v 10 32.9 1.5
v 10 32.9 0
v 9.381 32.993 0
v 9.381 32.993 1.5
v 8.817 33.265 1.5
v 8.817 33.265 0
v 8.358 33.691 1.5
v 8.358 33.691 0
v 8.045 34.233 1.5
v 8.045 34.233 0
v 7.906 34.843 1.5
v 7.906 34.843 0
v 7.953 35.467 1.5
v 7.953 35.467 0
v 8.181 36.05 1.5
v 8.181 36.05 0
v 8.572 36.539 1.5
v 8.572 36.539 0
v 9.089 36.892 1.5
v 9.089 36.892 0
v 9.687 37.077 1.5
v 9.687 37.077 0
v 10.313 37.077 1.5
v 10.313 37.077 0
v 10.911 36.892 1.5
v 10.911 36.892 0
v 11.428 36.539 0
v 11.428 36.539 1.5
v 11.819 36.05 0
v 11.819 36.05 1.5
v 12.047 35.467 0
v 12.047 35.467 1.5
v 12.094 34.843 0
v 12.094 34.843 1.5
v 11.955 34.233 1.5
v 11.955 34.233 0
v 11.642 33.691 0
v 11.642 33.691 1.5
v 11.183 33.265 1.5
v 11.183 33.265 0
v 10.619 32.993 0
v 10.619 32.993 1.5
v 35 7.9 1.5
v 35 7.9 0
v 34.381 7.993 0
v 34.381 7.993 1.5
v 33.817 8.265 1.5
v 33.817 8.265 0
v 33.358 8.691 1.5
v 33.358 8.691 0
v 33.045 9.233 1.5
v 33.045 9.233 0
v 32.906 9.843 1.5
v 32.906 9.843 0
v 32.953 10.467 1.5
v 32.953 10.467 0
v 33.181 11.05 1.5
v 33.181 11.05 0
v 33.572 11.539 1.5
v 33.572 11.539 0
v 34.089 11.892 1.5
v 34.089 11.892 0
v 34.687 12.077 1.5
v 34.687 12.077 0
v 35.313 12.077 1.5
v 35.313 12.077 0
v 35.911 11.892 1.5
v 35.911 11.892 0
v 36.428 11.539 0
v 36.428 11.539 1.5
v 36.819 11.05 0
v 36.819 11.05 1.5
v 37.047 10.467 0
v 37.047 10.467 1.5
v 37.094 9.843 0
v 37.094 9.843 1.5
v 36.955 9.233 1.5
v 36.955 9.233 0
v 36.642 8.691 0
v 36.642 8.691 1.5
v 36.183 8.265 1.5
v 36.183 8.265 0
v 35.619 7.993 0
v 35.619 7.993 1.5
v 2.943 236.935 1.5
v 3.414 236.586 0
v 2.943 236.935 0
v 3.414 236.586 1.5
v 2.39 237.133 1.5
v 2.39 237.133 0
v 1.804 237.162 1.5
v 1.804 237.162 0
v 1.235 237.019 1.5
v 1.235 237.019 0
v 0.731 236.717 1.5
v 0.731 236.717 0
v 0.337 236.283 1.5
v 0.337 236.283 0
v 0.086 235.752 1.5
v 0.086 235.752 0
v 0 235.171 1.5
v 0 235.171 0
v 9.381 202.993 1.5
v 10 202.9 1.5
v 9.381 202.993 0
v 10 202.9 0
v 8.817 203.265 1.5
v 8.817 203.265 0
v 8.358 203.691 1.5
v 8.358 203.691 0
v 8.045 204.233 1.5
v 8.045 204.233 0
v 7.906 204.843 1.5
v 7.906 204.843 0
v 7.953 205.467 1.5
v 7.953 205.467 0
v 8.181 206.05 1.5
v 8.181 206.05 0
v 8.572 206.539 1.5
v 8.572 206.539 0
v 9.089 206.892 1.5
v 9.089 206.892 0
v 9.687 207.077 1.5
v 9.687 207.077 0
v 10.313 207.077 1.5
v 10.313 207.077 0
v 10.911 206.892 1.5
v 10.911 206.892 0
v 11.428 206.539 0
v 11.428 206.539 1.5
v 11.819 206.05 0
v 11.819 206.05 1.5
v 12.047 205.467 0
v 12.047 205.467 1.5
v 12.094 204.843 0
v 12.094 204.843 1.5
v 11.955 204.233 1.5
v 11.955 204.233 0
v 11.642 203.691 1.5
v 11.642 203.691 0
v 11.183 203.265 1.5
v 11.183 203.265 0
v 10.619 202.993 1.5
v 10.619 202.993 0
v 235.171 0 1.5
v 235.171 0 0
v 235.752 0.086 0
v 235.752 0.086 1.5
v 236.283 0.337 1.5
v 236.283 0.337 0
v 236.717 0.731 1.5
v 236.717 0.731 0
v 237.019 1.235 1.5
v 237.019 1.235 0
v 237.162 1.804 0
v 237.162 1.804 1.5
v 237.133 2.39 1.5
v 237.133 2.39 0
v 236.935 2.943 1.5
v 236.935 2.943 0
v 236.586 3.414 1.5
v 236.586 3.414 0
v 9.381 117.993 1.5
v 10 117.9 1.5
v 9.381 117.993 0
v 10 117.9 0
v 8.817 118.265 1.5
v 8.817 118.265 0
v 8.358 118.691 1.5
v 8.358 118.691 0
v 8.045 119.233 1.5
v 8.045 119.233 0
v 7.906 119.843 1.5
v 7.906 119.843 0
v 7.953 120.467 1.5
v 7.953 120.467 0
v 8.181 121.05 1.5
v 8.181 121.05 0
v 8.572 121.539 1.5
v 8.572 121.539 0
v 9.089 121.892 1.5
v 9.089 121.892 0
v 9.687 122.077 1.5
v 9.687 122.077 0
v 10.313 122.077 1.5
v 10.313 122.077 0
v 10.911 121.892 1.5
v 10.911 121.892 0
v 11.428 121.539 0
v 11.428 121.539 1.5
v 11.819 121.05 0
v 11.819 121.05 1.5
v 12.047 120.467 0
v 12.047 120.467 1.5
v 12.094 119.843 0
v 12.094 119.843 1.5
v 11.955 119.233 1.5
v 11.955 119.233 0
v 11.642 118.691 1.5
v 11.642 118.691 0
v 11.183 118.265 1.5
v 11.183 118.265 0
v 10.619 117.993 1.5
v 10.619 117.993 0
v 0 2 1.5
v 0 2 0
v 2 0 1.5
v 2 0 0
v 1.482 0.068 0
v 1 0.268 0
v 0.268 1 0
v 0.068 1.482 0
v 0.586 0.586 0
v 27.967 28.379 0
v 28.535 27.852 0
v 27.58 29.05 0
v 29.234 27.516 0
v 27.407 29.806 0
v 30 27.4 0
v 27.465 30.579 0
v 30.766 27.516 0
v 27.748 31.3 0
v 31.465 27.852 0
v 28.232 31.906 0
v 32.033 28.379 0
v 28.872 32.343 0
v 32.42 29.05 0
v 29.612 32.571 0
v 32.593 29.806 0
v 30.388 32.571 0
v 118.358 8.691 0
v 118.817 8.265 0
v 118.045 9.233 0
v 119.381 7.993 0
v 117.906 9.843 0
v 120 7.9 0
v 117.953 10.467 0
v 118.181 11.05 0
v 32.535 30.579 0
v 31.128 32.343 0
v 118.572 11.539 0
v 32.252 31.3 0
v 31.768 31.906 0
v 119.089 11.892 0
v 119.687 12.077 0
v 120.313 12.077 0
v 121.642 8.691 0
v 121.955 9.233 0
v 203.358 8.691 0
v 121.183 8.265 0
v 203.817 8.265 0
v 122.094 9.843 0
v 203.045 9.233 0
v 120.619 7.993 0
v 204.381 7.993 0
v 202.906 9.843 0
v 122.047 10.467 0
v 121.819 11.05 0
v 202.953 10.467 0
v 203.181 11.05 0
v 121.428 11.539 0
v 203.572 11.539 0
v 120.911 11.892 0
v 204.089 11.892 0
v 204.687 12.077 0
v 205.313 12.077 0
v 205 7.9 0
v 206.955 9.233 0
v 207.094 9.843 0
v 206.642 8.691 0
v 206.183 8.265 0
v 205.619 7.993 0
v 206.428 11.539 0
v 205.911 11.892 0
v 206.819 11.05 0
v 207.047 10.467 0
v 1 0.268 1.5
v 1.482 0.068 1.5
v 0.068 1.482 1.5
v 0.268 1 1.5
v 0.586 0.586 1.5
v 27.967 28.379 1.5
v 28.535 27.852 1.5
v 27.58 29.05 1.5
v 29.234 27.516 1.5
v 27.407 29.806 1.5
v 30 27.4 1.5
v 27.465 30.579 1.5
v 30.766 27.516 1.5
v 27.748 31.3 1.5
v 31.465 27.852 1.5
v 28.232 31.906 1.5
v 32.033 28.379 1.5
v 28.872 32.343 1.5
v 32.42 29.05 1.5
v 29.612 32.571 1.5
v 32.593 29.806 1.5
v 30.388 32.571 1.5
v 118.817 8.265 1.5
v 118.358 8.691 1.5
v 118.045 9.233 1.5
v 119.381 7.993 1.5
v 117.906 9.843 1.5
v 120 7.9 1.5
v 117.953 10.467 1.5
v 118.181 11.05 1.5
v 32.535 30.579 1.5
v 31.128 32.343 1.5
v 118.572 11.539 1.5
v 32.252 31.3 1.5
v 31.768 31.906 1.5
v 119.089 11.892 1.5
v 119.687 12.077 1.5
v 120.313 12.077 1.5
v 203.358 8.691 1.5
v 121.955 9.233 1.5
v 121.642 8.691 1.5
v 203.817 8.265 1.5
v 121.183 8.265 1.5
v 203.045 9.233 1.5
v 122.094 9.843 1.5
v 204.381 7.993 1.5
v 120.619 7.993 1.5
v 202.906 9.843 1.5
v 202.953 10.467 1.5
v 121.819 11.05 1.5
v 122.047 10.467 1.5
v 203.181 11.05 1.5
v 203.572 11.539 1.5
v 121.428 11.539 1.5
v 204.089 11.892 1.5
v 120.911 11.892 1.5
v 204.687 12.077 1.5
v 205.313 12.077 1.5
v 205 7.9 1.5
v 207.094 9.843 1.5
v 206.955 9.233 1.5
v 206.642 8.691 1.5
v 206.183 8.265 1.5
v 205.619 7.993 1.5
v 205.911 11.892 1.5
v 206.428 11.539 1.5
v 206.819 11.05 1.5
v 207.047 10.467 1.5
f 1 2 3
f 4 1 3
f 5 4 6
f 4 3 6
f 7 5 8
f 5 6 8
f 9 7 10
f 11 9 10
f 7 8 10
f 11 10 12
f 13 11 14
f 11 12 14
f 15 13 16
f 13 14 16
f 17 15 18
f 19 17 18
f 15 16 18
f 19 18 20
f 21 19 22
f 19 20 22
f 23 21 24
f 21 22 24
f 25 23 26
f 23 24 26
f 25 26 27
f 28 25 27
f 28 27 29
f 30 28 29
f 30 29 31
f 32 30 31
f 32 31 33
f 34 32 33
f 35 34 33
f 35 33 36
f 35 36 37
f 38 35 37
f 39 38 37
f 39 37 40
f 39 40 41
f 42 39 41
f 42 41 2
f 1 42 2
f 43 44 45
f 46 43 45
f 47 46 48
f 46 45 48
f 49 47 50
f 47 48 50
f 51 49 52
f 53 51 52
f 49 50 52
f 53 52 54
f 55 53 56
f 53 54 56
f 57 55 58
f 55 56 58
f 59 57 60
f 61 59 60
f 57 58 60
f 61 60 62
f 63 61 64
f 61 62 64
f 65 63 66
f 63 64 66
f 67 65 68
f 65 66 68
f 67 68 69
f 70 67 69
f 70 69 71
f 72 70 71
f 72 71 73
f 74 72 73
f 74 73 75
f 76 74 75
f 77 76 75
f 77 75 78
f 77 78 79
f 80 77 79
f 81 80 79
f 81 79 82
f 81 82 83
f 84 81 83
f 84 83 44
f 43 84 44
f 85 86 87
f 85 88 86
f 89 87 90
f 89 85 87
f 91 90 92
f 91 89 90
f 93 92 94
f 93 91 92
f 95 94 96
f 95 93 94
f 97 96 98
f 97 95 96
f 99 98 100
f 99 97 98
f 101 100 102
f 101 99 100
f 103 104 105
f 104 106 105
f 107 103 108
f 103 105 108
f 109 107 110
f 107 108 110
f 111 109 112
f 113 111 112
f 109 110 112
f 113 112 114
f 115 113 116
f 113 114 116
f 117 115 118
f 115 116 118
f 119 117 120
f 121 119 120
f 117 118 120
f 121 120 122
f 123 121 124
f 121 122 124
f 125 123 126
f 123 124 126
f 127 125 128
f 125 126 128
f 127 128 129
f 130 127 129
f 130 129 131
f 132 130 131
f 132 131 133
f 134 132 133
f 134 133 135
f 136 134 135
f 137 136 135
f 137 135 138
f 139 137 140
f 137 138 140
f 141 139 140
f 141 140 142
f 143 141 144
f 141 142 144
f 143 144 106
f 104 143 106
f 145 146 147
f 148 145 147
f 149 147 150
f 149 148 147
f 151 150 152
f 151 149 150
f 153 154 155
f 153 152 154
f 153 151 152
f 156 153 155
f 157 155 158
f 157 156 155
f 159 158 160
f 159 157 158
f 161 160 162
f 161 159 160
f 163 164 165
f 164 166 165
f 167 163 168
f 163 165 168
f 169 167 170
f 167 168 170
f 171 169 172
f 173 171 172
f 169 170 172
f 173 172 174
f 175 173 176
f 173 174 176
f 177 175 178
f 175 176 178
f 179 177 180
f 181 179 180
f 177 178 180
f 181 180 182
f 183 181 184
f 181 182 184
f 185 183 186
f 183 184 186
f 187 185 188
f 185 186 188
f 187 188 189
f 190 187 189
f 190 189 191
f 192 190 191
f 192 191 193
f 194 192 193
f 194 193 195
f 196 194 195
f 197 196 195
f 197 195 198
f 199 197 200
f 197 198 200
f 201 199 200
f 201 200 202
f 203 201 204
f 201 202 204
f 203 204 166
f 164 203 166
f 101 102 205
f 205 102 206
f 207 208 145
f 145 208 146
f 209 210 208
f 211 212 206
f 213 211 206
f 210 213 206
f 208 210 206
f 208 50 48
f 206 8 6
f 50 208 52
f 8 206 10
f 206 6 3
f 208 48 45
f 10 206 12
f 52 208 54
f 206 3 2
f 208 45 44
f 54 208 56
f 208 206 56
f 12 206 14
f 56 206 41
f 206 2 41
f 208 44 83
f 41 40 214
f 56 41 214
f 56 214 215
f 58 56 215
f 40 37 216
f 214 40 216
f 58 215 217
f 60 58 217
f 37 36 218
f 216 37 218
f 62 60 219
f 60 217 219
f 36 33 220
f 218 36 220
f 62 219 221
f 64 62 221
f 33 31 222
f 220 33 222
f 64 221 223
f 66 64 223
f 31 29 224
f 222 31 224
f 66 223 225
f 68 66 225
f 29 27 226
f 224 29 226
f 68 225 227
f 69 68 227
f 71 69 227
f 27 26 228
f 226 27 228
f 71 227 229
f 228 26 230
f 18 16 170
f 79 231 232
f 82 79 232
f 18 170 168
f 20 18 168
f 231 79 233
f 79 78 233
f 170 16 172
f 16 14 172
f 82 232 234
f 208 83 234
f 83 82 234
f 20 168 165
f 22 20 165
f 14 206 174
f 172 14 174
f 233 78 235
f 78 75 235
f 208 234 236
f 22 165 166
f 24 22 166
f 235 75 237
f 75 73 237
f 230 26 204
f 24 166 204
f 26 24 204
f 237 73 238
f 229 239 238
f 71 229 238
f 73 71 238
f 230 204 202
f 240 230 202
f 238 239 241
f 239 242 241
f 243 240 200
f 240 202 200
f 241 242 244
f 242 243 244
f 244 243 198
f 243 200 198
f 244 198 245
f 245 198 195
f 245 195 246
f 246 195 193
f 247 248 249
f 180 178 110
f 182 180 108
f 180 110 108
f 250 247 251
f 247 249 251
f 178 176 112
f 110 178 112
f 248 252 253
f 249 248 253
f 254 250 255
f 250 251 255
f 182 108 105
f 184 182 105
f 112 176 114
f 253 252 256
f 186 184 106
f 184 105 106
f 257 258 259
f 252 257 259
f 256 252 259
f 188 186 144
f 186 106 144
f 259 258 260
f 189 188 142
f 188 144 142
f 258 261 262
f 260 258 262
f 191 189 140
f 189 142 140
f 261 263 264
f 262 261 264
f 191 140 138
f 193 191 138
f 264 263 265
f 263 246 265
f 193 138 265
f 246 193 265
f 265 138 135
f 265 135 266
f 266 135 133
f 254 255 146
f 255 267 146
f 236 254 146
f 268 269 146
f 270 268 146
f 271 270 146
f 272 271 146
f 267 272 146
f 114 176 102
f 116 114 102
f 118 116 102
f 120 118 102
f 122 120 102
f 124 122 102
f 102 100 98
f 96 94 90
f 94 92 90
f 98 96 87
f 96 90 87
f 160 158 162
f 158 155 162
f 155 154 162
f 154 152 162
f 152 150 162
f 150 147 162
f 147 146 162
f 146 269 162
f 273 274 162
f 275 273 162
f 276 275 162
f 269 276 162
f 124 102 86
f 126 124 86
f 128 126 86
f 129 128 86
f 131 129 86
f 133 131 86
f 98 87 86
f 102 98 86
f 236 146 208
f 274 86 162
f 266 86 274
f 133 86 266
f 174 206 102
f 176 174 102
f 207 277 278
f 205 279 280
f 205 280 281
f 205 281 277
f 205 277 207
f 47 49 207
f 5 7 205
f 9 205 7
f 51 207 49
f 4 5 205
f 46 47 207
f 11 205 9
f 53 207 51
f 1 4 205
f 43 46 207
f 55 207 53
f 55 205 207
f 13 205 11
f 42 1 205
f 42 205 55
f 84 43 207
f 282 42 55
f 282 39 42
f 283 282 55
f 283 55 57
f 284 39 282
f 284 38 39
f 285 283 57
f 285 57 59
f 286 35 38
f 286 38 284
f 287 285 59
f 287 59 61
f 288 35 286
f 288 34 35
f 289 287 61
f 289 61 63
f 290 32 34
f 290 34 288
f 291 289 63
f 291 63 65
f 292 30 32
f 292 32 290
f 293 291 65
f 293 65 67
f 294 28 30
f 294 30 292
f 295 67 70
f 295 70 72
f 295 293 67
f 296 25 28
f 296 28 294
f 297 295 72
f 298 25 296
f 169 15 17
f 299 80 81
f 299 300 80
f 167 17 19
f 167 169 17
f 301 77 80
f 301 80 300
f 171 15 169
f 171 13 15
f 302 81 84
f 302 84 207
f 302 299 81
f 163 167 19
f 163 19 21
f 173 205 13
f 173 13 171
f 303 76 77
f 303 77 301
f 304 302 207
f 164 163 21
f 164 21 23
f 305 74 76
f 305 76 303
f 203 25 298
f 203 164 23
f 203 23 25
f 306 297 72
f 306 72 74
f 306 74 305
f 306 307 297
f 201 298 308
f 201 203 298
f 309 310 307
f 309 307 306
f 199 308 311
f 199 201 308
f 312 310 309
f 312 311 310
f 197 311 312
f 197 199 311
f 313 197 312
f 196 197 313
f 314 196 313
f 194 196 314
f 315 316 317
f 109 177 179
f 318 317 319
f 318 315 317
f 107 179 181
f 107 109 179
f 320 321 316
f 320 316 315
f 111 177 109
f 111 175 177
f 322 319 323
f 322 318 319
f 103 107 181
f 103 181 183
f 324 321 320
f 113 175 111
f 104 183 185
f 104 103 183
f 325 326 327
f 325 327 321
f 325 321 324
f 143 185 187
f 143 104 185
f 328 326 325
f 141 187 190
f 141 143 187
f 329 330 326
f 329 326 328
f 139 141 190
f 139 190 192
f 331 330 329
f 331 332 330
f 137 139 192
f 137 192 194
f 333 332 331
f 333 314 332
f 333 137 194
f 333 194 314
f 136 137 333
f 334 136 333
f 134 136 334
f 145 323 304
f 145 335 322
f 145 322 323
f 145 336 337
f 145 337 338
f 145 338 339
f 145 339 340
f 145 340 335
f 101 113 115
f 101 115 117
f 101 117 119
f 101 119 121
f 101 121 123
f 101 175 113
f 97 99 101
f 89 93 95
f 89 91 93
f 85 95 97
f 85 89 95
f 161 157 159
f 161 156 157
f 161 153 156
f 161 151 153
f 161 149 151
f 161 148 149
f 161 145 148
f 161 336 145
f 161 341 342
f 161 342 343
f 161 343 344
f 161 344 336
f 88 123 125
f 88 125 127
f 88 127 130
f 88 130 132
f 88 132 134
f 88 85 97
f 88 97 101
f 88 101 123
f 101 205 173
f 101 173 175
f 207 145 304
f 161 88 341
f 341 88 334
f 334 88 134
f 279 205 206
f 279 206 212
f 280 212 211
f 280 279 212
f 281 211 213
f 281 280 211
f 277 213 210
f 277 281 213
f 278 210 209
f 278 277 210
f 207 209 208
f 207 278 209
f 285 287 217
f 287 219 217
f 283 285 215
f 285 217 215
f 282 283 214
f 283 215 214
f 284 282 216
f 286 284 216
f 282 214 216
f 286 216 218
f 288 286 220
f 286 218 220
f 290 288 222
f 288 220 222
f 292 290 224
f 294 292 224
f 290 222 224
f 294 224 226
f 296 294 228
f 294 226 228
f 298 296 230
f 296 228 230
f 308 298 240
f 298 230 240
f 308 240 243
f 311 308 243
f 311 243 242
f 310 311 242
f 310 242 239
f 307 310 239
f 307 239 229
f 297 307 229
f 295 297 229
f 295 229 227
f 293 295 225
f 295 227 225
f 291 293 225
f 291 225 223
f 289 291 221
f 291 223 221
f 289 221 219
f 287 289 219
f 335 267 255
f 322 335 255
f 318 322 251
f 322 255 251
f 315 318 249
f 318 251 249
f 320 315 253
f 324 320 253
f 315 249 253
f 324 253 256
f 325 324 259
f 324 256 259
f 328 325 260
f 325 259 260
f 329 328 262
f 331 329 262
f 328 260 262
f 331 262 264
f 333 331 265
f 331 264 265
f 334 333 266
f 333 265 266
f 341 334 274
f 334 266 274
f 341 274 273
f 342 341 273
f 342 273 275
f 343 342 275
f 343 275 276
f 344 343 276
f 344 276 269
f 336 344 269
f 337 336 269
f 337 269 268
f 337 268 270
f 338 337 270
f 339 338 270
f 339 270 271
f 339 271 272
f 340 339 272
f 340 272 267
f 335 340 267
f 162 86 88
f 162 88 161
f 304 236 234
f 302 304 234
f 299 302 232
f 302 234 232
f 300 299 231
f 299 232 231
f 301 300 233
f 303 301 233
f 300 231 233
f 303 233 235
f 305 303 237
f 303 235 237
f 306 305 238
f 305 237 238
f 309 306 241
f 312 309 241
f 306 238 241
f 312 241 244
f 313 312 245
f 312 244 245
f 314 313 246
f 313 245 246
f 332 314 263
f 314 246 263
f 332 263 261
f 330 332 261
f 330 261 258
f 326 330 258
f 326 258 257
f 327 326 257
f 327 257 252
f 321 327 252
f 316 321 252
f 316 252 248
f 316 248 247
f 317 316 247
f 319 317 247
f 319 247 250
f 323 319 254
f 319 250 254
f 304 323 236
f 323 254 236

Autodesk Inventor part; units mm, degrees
ref_plane "YZ Plane" through (0, 0, 0) normal (1, 0, 0) x (0, 1, 0)
ref_plane "XZ Plane" through (0, 0, 0) normal (0, 1, 0) x (-1, 0, 0)
ref_plane "XY Plane" through (0, 0, 0) normal (0, 0, 1) x (1, 0, 0)
sketch "スケッチ1" plane through (0, 0, 0) normal (0, 0, 1) x (1, 0, 0)
  line L0 (0, 0) -> (239.9998, 0)
  line L1 (239.9998, 0) -> (239.9998, 239.9998)
  line L2 (239.9998, 239.9998) -> (0, 239.9998)
  line L3 (0, 239.9998) -> (0, 0)
  line L4 (0, 239.9998) -> (239.9998, 0)
  line L5 (-178.706, 178.706) -> (151.9787, -151.9787)
  dimension "d16" = 45
  dimension "d17" = 169.7055
extrude "プレート1" add sketch "スケッチ1" along normal blind 1.5 contours L3 L4 L0
sketch "スケッチ2" plane through (0, 0, 1.5) normal (0, 0, 1) x (1, 0, 0)
  line L0 (90, 33.5) -> (110, 33.5)
  line L1 (110, 33.5) -> (110, 86.5)
  line L2 (110, 86.5) -> (90, 86.5)
  line L3 (90, 86.5) -> (90, 33.5)
  line L4 (90, 33.5) -> (110, 86.5) construction
  line L5 (110, 33.5) -> (90, 86.5) construction
  line L6 (239.9998, 0) -> (0, 0) projected
  line L7 (0, 0) -> (0, 239.9998) projected
  line L8 (134, 30) -> (66, 30)
  line L9 (66, 30) -> (66, 90)
  line L10 (66, 90) -> (134, 90)
  line L11 (134, 90) -> (134, 30)
  line L12 (134, 30) -> (66, 90) construction
  line L13 (66, 30) -> (134, 90) construction
  point P0 (100, 60)
  dimension "d3" = 20
  dimension "d4" = 53
  dimension "d5" = 60
  dimension "d6" = 100
  dimension "d14" = 60
  dimension "d15" = 68
hole "穴1" at (90, 33.5, 1.5) at (110, 33.5, 1.5) at (90, 86.5, 1.5) at (110, 86.5, 1.5) at (66, 30, 1.5) at (134, 30, 1.5) at (66, 90, 1.5) direction (0, 0, -1) diameter 5.2 depth 1.5 tip angle 118
fillet "フィレット1" radius 2 3 edges at (0, 239.9998, 0.75) (0, 0, 0.75) (239.9998, 0, 0.75)
sketch "スケッチ3" plane through (0, 0, 1.5) normal (0, 0, 1) x (1, 0, 0)
  circle A0 centre (66, 90) radius 2.6 projected
  line L0 (0, 2) -> (0, 235.1714) projected
  point P0 (0, 0)
  point P1 (90, 117)
  point P2 (80, 117)
  dimension "d19" = 10
  dimension "d20" = 27
  dimension "d21" = 80
hole "穴2" at (90, 117, 1.5) at (80, 117, 1.5) direction (0, 0, -1) diameter 3.242 depth 11.8 tip angle 118 thread size "M4x0.7" class "6H" standard "ISO Metric profile"
sketch "スケッチ4" plane through (0, 0, 1.5) normal (0, 0, 1) x (1, 0, 0)
  circle A0 centre (90, 117) radius 1.621 projected
  circle A1 centre (80, 117) radius 1.621 projected
  arc A2 (235.1714, 0) -> (236.5856, 3.4142) centre (235.1714, 2) ccw projected
  line L0 (3.4142, 236.5856) -> (236.5856, 3.4142) projected
  arc A3 (3.4142, 236.5856) -> (0, 235.1714) centre (2, 235.1714) ccw projected
  line L1 (0, 2) -> (0, 235.1714) projected
  arc A4 (0, 2) -> (2, 0) centre (2, 2) ccw projected
  line L2 (235.1714, 0) -> (2, 0) projected
  circle A5 centre (134, 30) radius 2.6 projected
  circle A6 centre (110, 86.5) radius 2.6 projected
  circle A7 centre (110, 33.5) radius 2.6 projected
  circle A8 centre (90, 33.5) radius 2.6 projected
  circle A9 centre (90, 86.5) radius 2.6 projected
  circle A10 centre (66, 30) radius 2.6 projected
  circle A11 centre (66, 90) radius 2.6 projected
  line L3 (10, 10) -> (10, 215.8577)
  line L4 (10, 215.8577) -> (215.8577, 10)
  line L5 (215.8577, 10) -> (10, 10)
  point P0 (0, 0)
  point P1 (205, 10)
  point P2 (35, 10)
  point P3 (10, 35)
  point P4 (10, 205)
  point P5 (120, 10)
  point P6 (10, 120)
  dimension "d29" = 10
  dimension "d30" = 25
  dimension "d31" = 25
  dimension "d32" = 170
  dimension "d33" = 170
  dimension "d34" = 85
  dimension "d35" = 85
hole "穴3" at (205, 10, 1.5) at (35, 10, 1.5) at (10, 35, 1.5) at (10, 205, 1.5) at (120, 10, 1.5) at (10, 120, 1.5) direction (0, 0, -1) diameter 4.2 depth 1.5 tip angle 118
sketch "スケッチ6" plane through (0, 0, 1.5) normal (0, 0, 1) x (1, 0, 0)
  circle A0 centre (120, 10) radius 2.1 projected
  circle A1 centre (10, 35) radius 2.1 projected
  circle A2 centre (205, 10) radius 2.1 projected
  circle A3 centre (35, 10) radius 2.1 projected
  circle A4 centre (10, 205) radius 2.1 projected
  circle A5 centre (10, 120) radius 2.1 projected
  circle A6 centre (90, 117) radius 1.621 projected
  circle A7 centre (80, 117) radius 1.621 projected
  arc A8 (235.1714, 0) -> (236.5856, 3.4142) centre (235.1714, 2) ccw projected
  line L0 (3.4142, 236.5856) -> (236.5856, 3.4142) projected
  arc A9 (3.4142, 236.5856) -> (0, 235.1714) centre (2, 235.1714) ccw projected
  line L1 (0, 2) -> (0, 235.1714) projected
  arc A10 (0, 2) -> (2, 0) centre (2, 2) ccw projected
  line L2 (235.1714, 0) -> (2, 0) projected
  circle A11 centre (134, 30) radius 2.6 projected
  circle A12 centre (110, 86.5) radius 2.6 projected
  circle A13 centre (110, 33.5) radius 2.6 projected
  circle A14 centre (90, 33.5) radius 2.6 projected
  circle A15 centre (90, 86.5) radius 2.6 projected
  circle A16 centre (66, 30) radius 2.6 projected
  circle A17 centre (66, 90) radius 2.6 projected
  line L3 (20, 20) -> (20, 191.7155)
  line L4 (20, 191.7155) -> (191.7155, 20)
  line L5 (191.7155, 20) -> (20, 20)
  point P0 (0, 0)
  point P1 (30, 30)
  dimension "d46" = 20
  dimension "d47" = 10
  dimension "d48" = 10
hole "穴4" at (30, 30, 1.5) direction (0, 0, -1) diameter 5.2 depth 1.5 tip angle 118
sketch "スケッチ7" plane through (0, 0, 1.5) normal (0, 0, 1) x (1, 0, 0)
  circle A0 centre (30, 30) radius 2.6 projected
  circle A1 centre (120, 10) radius 2.1 projected
  circle A2 centre (10, 35) radius 2.1 projected
  circle A3 centre (205, 10) radius 2.1 projected
  circle A4 centre (35, 10) radius 2.1 projected
  circle A5 centre (10, 205) radius 2.1 projected
  circle A6 centre (10, 120) radius 2.1 projected
  circle A7 centre (90, 117) radius 1.621 projected
  circle A8 centre (80, 117) radius 1.621 projected
  arc A9 (235.1714, 0) -> (236.5856, 3.4142) centre (235.1714, 2) ccw projected
  line L0 (3.4142, 236.5856) -> (236.5856, 3.4142) projected
  arc A10 (3.4142, 236.5856) -> (0, 235.1714) centre (2, 235.1714) ccw projected
  line L1 (0, 2) -> (0, 235.1714) projected
  arc A11 (0, 2) -> (2, 0) centre (2, 2) ccw projected
  line L2 (235.1714, 0) -> (2, 0) projected
  circle A12 centre (134, 30) radius 2.6 projected
  circle A13 centre (110, 86.5) radius 2.6 projected
  circle A14 centre (110, 33.5) radius 2.6 projected
  circle A15 centre (90, 33.5) radius 2.6 projected
  circle A16 centre (90, 86.5) radius 2.6 projected
  circle A17 centre (66, 30) radius 2.6 projected
  circle A18 centre (66, 90) radius 2.6 projected
  point P0 (0, 0)
extrude "押し出し2" add sketch "スケッチ7" against normal up to surface (1.5 mm away) contours A7 | A8 | A12 | A13 | A14 | A15 | A16 | A17 | A18
equation "\"d12\" = Thickness"
equation "\"d41\" = Thickness"
equation "\"d54\" = Thickness"
equation "\"d2\" = Thickness"
equation "\"BendRadius\" = Thickness"
equation "\"BendReliefWidth\" = Thickness"
equation "\"BendReliefDepth\" = 0.5 * Thickness"
equation "\"CornerReliefSize\" = 4 * Thickness"
equation "\"MinimumRemnant\" = 2 * Thickness"
equation "\"TransitionRadius\" = BendRadius"
equation "\"JacobiRadiusSize\" = BendRadius"
equation "\"GapSize\" = Thickness"
equation "\"Thickness\" = 1.5"
properties part number "Display_CCM_Mount_Top"
